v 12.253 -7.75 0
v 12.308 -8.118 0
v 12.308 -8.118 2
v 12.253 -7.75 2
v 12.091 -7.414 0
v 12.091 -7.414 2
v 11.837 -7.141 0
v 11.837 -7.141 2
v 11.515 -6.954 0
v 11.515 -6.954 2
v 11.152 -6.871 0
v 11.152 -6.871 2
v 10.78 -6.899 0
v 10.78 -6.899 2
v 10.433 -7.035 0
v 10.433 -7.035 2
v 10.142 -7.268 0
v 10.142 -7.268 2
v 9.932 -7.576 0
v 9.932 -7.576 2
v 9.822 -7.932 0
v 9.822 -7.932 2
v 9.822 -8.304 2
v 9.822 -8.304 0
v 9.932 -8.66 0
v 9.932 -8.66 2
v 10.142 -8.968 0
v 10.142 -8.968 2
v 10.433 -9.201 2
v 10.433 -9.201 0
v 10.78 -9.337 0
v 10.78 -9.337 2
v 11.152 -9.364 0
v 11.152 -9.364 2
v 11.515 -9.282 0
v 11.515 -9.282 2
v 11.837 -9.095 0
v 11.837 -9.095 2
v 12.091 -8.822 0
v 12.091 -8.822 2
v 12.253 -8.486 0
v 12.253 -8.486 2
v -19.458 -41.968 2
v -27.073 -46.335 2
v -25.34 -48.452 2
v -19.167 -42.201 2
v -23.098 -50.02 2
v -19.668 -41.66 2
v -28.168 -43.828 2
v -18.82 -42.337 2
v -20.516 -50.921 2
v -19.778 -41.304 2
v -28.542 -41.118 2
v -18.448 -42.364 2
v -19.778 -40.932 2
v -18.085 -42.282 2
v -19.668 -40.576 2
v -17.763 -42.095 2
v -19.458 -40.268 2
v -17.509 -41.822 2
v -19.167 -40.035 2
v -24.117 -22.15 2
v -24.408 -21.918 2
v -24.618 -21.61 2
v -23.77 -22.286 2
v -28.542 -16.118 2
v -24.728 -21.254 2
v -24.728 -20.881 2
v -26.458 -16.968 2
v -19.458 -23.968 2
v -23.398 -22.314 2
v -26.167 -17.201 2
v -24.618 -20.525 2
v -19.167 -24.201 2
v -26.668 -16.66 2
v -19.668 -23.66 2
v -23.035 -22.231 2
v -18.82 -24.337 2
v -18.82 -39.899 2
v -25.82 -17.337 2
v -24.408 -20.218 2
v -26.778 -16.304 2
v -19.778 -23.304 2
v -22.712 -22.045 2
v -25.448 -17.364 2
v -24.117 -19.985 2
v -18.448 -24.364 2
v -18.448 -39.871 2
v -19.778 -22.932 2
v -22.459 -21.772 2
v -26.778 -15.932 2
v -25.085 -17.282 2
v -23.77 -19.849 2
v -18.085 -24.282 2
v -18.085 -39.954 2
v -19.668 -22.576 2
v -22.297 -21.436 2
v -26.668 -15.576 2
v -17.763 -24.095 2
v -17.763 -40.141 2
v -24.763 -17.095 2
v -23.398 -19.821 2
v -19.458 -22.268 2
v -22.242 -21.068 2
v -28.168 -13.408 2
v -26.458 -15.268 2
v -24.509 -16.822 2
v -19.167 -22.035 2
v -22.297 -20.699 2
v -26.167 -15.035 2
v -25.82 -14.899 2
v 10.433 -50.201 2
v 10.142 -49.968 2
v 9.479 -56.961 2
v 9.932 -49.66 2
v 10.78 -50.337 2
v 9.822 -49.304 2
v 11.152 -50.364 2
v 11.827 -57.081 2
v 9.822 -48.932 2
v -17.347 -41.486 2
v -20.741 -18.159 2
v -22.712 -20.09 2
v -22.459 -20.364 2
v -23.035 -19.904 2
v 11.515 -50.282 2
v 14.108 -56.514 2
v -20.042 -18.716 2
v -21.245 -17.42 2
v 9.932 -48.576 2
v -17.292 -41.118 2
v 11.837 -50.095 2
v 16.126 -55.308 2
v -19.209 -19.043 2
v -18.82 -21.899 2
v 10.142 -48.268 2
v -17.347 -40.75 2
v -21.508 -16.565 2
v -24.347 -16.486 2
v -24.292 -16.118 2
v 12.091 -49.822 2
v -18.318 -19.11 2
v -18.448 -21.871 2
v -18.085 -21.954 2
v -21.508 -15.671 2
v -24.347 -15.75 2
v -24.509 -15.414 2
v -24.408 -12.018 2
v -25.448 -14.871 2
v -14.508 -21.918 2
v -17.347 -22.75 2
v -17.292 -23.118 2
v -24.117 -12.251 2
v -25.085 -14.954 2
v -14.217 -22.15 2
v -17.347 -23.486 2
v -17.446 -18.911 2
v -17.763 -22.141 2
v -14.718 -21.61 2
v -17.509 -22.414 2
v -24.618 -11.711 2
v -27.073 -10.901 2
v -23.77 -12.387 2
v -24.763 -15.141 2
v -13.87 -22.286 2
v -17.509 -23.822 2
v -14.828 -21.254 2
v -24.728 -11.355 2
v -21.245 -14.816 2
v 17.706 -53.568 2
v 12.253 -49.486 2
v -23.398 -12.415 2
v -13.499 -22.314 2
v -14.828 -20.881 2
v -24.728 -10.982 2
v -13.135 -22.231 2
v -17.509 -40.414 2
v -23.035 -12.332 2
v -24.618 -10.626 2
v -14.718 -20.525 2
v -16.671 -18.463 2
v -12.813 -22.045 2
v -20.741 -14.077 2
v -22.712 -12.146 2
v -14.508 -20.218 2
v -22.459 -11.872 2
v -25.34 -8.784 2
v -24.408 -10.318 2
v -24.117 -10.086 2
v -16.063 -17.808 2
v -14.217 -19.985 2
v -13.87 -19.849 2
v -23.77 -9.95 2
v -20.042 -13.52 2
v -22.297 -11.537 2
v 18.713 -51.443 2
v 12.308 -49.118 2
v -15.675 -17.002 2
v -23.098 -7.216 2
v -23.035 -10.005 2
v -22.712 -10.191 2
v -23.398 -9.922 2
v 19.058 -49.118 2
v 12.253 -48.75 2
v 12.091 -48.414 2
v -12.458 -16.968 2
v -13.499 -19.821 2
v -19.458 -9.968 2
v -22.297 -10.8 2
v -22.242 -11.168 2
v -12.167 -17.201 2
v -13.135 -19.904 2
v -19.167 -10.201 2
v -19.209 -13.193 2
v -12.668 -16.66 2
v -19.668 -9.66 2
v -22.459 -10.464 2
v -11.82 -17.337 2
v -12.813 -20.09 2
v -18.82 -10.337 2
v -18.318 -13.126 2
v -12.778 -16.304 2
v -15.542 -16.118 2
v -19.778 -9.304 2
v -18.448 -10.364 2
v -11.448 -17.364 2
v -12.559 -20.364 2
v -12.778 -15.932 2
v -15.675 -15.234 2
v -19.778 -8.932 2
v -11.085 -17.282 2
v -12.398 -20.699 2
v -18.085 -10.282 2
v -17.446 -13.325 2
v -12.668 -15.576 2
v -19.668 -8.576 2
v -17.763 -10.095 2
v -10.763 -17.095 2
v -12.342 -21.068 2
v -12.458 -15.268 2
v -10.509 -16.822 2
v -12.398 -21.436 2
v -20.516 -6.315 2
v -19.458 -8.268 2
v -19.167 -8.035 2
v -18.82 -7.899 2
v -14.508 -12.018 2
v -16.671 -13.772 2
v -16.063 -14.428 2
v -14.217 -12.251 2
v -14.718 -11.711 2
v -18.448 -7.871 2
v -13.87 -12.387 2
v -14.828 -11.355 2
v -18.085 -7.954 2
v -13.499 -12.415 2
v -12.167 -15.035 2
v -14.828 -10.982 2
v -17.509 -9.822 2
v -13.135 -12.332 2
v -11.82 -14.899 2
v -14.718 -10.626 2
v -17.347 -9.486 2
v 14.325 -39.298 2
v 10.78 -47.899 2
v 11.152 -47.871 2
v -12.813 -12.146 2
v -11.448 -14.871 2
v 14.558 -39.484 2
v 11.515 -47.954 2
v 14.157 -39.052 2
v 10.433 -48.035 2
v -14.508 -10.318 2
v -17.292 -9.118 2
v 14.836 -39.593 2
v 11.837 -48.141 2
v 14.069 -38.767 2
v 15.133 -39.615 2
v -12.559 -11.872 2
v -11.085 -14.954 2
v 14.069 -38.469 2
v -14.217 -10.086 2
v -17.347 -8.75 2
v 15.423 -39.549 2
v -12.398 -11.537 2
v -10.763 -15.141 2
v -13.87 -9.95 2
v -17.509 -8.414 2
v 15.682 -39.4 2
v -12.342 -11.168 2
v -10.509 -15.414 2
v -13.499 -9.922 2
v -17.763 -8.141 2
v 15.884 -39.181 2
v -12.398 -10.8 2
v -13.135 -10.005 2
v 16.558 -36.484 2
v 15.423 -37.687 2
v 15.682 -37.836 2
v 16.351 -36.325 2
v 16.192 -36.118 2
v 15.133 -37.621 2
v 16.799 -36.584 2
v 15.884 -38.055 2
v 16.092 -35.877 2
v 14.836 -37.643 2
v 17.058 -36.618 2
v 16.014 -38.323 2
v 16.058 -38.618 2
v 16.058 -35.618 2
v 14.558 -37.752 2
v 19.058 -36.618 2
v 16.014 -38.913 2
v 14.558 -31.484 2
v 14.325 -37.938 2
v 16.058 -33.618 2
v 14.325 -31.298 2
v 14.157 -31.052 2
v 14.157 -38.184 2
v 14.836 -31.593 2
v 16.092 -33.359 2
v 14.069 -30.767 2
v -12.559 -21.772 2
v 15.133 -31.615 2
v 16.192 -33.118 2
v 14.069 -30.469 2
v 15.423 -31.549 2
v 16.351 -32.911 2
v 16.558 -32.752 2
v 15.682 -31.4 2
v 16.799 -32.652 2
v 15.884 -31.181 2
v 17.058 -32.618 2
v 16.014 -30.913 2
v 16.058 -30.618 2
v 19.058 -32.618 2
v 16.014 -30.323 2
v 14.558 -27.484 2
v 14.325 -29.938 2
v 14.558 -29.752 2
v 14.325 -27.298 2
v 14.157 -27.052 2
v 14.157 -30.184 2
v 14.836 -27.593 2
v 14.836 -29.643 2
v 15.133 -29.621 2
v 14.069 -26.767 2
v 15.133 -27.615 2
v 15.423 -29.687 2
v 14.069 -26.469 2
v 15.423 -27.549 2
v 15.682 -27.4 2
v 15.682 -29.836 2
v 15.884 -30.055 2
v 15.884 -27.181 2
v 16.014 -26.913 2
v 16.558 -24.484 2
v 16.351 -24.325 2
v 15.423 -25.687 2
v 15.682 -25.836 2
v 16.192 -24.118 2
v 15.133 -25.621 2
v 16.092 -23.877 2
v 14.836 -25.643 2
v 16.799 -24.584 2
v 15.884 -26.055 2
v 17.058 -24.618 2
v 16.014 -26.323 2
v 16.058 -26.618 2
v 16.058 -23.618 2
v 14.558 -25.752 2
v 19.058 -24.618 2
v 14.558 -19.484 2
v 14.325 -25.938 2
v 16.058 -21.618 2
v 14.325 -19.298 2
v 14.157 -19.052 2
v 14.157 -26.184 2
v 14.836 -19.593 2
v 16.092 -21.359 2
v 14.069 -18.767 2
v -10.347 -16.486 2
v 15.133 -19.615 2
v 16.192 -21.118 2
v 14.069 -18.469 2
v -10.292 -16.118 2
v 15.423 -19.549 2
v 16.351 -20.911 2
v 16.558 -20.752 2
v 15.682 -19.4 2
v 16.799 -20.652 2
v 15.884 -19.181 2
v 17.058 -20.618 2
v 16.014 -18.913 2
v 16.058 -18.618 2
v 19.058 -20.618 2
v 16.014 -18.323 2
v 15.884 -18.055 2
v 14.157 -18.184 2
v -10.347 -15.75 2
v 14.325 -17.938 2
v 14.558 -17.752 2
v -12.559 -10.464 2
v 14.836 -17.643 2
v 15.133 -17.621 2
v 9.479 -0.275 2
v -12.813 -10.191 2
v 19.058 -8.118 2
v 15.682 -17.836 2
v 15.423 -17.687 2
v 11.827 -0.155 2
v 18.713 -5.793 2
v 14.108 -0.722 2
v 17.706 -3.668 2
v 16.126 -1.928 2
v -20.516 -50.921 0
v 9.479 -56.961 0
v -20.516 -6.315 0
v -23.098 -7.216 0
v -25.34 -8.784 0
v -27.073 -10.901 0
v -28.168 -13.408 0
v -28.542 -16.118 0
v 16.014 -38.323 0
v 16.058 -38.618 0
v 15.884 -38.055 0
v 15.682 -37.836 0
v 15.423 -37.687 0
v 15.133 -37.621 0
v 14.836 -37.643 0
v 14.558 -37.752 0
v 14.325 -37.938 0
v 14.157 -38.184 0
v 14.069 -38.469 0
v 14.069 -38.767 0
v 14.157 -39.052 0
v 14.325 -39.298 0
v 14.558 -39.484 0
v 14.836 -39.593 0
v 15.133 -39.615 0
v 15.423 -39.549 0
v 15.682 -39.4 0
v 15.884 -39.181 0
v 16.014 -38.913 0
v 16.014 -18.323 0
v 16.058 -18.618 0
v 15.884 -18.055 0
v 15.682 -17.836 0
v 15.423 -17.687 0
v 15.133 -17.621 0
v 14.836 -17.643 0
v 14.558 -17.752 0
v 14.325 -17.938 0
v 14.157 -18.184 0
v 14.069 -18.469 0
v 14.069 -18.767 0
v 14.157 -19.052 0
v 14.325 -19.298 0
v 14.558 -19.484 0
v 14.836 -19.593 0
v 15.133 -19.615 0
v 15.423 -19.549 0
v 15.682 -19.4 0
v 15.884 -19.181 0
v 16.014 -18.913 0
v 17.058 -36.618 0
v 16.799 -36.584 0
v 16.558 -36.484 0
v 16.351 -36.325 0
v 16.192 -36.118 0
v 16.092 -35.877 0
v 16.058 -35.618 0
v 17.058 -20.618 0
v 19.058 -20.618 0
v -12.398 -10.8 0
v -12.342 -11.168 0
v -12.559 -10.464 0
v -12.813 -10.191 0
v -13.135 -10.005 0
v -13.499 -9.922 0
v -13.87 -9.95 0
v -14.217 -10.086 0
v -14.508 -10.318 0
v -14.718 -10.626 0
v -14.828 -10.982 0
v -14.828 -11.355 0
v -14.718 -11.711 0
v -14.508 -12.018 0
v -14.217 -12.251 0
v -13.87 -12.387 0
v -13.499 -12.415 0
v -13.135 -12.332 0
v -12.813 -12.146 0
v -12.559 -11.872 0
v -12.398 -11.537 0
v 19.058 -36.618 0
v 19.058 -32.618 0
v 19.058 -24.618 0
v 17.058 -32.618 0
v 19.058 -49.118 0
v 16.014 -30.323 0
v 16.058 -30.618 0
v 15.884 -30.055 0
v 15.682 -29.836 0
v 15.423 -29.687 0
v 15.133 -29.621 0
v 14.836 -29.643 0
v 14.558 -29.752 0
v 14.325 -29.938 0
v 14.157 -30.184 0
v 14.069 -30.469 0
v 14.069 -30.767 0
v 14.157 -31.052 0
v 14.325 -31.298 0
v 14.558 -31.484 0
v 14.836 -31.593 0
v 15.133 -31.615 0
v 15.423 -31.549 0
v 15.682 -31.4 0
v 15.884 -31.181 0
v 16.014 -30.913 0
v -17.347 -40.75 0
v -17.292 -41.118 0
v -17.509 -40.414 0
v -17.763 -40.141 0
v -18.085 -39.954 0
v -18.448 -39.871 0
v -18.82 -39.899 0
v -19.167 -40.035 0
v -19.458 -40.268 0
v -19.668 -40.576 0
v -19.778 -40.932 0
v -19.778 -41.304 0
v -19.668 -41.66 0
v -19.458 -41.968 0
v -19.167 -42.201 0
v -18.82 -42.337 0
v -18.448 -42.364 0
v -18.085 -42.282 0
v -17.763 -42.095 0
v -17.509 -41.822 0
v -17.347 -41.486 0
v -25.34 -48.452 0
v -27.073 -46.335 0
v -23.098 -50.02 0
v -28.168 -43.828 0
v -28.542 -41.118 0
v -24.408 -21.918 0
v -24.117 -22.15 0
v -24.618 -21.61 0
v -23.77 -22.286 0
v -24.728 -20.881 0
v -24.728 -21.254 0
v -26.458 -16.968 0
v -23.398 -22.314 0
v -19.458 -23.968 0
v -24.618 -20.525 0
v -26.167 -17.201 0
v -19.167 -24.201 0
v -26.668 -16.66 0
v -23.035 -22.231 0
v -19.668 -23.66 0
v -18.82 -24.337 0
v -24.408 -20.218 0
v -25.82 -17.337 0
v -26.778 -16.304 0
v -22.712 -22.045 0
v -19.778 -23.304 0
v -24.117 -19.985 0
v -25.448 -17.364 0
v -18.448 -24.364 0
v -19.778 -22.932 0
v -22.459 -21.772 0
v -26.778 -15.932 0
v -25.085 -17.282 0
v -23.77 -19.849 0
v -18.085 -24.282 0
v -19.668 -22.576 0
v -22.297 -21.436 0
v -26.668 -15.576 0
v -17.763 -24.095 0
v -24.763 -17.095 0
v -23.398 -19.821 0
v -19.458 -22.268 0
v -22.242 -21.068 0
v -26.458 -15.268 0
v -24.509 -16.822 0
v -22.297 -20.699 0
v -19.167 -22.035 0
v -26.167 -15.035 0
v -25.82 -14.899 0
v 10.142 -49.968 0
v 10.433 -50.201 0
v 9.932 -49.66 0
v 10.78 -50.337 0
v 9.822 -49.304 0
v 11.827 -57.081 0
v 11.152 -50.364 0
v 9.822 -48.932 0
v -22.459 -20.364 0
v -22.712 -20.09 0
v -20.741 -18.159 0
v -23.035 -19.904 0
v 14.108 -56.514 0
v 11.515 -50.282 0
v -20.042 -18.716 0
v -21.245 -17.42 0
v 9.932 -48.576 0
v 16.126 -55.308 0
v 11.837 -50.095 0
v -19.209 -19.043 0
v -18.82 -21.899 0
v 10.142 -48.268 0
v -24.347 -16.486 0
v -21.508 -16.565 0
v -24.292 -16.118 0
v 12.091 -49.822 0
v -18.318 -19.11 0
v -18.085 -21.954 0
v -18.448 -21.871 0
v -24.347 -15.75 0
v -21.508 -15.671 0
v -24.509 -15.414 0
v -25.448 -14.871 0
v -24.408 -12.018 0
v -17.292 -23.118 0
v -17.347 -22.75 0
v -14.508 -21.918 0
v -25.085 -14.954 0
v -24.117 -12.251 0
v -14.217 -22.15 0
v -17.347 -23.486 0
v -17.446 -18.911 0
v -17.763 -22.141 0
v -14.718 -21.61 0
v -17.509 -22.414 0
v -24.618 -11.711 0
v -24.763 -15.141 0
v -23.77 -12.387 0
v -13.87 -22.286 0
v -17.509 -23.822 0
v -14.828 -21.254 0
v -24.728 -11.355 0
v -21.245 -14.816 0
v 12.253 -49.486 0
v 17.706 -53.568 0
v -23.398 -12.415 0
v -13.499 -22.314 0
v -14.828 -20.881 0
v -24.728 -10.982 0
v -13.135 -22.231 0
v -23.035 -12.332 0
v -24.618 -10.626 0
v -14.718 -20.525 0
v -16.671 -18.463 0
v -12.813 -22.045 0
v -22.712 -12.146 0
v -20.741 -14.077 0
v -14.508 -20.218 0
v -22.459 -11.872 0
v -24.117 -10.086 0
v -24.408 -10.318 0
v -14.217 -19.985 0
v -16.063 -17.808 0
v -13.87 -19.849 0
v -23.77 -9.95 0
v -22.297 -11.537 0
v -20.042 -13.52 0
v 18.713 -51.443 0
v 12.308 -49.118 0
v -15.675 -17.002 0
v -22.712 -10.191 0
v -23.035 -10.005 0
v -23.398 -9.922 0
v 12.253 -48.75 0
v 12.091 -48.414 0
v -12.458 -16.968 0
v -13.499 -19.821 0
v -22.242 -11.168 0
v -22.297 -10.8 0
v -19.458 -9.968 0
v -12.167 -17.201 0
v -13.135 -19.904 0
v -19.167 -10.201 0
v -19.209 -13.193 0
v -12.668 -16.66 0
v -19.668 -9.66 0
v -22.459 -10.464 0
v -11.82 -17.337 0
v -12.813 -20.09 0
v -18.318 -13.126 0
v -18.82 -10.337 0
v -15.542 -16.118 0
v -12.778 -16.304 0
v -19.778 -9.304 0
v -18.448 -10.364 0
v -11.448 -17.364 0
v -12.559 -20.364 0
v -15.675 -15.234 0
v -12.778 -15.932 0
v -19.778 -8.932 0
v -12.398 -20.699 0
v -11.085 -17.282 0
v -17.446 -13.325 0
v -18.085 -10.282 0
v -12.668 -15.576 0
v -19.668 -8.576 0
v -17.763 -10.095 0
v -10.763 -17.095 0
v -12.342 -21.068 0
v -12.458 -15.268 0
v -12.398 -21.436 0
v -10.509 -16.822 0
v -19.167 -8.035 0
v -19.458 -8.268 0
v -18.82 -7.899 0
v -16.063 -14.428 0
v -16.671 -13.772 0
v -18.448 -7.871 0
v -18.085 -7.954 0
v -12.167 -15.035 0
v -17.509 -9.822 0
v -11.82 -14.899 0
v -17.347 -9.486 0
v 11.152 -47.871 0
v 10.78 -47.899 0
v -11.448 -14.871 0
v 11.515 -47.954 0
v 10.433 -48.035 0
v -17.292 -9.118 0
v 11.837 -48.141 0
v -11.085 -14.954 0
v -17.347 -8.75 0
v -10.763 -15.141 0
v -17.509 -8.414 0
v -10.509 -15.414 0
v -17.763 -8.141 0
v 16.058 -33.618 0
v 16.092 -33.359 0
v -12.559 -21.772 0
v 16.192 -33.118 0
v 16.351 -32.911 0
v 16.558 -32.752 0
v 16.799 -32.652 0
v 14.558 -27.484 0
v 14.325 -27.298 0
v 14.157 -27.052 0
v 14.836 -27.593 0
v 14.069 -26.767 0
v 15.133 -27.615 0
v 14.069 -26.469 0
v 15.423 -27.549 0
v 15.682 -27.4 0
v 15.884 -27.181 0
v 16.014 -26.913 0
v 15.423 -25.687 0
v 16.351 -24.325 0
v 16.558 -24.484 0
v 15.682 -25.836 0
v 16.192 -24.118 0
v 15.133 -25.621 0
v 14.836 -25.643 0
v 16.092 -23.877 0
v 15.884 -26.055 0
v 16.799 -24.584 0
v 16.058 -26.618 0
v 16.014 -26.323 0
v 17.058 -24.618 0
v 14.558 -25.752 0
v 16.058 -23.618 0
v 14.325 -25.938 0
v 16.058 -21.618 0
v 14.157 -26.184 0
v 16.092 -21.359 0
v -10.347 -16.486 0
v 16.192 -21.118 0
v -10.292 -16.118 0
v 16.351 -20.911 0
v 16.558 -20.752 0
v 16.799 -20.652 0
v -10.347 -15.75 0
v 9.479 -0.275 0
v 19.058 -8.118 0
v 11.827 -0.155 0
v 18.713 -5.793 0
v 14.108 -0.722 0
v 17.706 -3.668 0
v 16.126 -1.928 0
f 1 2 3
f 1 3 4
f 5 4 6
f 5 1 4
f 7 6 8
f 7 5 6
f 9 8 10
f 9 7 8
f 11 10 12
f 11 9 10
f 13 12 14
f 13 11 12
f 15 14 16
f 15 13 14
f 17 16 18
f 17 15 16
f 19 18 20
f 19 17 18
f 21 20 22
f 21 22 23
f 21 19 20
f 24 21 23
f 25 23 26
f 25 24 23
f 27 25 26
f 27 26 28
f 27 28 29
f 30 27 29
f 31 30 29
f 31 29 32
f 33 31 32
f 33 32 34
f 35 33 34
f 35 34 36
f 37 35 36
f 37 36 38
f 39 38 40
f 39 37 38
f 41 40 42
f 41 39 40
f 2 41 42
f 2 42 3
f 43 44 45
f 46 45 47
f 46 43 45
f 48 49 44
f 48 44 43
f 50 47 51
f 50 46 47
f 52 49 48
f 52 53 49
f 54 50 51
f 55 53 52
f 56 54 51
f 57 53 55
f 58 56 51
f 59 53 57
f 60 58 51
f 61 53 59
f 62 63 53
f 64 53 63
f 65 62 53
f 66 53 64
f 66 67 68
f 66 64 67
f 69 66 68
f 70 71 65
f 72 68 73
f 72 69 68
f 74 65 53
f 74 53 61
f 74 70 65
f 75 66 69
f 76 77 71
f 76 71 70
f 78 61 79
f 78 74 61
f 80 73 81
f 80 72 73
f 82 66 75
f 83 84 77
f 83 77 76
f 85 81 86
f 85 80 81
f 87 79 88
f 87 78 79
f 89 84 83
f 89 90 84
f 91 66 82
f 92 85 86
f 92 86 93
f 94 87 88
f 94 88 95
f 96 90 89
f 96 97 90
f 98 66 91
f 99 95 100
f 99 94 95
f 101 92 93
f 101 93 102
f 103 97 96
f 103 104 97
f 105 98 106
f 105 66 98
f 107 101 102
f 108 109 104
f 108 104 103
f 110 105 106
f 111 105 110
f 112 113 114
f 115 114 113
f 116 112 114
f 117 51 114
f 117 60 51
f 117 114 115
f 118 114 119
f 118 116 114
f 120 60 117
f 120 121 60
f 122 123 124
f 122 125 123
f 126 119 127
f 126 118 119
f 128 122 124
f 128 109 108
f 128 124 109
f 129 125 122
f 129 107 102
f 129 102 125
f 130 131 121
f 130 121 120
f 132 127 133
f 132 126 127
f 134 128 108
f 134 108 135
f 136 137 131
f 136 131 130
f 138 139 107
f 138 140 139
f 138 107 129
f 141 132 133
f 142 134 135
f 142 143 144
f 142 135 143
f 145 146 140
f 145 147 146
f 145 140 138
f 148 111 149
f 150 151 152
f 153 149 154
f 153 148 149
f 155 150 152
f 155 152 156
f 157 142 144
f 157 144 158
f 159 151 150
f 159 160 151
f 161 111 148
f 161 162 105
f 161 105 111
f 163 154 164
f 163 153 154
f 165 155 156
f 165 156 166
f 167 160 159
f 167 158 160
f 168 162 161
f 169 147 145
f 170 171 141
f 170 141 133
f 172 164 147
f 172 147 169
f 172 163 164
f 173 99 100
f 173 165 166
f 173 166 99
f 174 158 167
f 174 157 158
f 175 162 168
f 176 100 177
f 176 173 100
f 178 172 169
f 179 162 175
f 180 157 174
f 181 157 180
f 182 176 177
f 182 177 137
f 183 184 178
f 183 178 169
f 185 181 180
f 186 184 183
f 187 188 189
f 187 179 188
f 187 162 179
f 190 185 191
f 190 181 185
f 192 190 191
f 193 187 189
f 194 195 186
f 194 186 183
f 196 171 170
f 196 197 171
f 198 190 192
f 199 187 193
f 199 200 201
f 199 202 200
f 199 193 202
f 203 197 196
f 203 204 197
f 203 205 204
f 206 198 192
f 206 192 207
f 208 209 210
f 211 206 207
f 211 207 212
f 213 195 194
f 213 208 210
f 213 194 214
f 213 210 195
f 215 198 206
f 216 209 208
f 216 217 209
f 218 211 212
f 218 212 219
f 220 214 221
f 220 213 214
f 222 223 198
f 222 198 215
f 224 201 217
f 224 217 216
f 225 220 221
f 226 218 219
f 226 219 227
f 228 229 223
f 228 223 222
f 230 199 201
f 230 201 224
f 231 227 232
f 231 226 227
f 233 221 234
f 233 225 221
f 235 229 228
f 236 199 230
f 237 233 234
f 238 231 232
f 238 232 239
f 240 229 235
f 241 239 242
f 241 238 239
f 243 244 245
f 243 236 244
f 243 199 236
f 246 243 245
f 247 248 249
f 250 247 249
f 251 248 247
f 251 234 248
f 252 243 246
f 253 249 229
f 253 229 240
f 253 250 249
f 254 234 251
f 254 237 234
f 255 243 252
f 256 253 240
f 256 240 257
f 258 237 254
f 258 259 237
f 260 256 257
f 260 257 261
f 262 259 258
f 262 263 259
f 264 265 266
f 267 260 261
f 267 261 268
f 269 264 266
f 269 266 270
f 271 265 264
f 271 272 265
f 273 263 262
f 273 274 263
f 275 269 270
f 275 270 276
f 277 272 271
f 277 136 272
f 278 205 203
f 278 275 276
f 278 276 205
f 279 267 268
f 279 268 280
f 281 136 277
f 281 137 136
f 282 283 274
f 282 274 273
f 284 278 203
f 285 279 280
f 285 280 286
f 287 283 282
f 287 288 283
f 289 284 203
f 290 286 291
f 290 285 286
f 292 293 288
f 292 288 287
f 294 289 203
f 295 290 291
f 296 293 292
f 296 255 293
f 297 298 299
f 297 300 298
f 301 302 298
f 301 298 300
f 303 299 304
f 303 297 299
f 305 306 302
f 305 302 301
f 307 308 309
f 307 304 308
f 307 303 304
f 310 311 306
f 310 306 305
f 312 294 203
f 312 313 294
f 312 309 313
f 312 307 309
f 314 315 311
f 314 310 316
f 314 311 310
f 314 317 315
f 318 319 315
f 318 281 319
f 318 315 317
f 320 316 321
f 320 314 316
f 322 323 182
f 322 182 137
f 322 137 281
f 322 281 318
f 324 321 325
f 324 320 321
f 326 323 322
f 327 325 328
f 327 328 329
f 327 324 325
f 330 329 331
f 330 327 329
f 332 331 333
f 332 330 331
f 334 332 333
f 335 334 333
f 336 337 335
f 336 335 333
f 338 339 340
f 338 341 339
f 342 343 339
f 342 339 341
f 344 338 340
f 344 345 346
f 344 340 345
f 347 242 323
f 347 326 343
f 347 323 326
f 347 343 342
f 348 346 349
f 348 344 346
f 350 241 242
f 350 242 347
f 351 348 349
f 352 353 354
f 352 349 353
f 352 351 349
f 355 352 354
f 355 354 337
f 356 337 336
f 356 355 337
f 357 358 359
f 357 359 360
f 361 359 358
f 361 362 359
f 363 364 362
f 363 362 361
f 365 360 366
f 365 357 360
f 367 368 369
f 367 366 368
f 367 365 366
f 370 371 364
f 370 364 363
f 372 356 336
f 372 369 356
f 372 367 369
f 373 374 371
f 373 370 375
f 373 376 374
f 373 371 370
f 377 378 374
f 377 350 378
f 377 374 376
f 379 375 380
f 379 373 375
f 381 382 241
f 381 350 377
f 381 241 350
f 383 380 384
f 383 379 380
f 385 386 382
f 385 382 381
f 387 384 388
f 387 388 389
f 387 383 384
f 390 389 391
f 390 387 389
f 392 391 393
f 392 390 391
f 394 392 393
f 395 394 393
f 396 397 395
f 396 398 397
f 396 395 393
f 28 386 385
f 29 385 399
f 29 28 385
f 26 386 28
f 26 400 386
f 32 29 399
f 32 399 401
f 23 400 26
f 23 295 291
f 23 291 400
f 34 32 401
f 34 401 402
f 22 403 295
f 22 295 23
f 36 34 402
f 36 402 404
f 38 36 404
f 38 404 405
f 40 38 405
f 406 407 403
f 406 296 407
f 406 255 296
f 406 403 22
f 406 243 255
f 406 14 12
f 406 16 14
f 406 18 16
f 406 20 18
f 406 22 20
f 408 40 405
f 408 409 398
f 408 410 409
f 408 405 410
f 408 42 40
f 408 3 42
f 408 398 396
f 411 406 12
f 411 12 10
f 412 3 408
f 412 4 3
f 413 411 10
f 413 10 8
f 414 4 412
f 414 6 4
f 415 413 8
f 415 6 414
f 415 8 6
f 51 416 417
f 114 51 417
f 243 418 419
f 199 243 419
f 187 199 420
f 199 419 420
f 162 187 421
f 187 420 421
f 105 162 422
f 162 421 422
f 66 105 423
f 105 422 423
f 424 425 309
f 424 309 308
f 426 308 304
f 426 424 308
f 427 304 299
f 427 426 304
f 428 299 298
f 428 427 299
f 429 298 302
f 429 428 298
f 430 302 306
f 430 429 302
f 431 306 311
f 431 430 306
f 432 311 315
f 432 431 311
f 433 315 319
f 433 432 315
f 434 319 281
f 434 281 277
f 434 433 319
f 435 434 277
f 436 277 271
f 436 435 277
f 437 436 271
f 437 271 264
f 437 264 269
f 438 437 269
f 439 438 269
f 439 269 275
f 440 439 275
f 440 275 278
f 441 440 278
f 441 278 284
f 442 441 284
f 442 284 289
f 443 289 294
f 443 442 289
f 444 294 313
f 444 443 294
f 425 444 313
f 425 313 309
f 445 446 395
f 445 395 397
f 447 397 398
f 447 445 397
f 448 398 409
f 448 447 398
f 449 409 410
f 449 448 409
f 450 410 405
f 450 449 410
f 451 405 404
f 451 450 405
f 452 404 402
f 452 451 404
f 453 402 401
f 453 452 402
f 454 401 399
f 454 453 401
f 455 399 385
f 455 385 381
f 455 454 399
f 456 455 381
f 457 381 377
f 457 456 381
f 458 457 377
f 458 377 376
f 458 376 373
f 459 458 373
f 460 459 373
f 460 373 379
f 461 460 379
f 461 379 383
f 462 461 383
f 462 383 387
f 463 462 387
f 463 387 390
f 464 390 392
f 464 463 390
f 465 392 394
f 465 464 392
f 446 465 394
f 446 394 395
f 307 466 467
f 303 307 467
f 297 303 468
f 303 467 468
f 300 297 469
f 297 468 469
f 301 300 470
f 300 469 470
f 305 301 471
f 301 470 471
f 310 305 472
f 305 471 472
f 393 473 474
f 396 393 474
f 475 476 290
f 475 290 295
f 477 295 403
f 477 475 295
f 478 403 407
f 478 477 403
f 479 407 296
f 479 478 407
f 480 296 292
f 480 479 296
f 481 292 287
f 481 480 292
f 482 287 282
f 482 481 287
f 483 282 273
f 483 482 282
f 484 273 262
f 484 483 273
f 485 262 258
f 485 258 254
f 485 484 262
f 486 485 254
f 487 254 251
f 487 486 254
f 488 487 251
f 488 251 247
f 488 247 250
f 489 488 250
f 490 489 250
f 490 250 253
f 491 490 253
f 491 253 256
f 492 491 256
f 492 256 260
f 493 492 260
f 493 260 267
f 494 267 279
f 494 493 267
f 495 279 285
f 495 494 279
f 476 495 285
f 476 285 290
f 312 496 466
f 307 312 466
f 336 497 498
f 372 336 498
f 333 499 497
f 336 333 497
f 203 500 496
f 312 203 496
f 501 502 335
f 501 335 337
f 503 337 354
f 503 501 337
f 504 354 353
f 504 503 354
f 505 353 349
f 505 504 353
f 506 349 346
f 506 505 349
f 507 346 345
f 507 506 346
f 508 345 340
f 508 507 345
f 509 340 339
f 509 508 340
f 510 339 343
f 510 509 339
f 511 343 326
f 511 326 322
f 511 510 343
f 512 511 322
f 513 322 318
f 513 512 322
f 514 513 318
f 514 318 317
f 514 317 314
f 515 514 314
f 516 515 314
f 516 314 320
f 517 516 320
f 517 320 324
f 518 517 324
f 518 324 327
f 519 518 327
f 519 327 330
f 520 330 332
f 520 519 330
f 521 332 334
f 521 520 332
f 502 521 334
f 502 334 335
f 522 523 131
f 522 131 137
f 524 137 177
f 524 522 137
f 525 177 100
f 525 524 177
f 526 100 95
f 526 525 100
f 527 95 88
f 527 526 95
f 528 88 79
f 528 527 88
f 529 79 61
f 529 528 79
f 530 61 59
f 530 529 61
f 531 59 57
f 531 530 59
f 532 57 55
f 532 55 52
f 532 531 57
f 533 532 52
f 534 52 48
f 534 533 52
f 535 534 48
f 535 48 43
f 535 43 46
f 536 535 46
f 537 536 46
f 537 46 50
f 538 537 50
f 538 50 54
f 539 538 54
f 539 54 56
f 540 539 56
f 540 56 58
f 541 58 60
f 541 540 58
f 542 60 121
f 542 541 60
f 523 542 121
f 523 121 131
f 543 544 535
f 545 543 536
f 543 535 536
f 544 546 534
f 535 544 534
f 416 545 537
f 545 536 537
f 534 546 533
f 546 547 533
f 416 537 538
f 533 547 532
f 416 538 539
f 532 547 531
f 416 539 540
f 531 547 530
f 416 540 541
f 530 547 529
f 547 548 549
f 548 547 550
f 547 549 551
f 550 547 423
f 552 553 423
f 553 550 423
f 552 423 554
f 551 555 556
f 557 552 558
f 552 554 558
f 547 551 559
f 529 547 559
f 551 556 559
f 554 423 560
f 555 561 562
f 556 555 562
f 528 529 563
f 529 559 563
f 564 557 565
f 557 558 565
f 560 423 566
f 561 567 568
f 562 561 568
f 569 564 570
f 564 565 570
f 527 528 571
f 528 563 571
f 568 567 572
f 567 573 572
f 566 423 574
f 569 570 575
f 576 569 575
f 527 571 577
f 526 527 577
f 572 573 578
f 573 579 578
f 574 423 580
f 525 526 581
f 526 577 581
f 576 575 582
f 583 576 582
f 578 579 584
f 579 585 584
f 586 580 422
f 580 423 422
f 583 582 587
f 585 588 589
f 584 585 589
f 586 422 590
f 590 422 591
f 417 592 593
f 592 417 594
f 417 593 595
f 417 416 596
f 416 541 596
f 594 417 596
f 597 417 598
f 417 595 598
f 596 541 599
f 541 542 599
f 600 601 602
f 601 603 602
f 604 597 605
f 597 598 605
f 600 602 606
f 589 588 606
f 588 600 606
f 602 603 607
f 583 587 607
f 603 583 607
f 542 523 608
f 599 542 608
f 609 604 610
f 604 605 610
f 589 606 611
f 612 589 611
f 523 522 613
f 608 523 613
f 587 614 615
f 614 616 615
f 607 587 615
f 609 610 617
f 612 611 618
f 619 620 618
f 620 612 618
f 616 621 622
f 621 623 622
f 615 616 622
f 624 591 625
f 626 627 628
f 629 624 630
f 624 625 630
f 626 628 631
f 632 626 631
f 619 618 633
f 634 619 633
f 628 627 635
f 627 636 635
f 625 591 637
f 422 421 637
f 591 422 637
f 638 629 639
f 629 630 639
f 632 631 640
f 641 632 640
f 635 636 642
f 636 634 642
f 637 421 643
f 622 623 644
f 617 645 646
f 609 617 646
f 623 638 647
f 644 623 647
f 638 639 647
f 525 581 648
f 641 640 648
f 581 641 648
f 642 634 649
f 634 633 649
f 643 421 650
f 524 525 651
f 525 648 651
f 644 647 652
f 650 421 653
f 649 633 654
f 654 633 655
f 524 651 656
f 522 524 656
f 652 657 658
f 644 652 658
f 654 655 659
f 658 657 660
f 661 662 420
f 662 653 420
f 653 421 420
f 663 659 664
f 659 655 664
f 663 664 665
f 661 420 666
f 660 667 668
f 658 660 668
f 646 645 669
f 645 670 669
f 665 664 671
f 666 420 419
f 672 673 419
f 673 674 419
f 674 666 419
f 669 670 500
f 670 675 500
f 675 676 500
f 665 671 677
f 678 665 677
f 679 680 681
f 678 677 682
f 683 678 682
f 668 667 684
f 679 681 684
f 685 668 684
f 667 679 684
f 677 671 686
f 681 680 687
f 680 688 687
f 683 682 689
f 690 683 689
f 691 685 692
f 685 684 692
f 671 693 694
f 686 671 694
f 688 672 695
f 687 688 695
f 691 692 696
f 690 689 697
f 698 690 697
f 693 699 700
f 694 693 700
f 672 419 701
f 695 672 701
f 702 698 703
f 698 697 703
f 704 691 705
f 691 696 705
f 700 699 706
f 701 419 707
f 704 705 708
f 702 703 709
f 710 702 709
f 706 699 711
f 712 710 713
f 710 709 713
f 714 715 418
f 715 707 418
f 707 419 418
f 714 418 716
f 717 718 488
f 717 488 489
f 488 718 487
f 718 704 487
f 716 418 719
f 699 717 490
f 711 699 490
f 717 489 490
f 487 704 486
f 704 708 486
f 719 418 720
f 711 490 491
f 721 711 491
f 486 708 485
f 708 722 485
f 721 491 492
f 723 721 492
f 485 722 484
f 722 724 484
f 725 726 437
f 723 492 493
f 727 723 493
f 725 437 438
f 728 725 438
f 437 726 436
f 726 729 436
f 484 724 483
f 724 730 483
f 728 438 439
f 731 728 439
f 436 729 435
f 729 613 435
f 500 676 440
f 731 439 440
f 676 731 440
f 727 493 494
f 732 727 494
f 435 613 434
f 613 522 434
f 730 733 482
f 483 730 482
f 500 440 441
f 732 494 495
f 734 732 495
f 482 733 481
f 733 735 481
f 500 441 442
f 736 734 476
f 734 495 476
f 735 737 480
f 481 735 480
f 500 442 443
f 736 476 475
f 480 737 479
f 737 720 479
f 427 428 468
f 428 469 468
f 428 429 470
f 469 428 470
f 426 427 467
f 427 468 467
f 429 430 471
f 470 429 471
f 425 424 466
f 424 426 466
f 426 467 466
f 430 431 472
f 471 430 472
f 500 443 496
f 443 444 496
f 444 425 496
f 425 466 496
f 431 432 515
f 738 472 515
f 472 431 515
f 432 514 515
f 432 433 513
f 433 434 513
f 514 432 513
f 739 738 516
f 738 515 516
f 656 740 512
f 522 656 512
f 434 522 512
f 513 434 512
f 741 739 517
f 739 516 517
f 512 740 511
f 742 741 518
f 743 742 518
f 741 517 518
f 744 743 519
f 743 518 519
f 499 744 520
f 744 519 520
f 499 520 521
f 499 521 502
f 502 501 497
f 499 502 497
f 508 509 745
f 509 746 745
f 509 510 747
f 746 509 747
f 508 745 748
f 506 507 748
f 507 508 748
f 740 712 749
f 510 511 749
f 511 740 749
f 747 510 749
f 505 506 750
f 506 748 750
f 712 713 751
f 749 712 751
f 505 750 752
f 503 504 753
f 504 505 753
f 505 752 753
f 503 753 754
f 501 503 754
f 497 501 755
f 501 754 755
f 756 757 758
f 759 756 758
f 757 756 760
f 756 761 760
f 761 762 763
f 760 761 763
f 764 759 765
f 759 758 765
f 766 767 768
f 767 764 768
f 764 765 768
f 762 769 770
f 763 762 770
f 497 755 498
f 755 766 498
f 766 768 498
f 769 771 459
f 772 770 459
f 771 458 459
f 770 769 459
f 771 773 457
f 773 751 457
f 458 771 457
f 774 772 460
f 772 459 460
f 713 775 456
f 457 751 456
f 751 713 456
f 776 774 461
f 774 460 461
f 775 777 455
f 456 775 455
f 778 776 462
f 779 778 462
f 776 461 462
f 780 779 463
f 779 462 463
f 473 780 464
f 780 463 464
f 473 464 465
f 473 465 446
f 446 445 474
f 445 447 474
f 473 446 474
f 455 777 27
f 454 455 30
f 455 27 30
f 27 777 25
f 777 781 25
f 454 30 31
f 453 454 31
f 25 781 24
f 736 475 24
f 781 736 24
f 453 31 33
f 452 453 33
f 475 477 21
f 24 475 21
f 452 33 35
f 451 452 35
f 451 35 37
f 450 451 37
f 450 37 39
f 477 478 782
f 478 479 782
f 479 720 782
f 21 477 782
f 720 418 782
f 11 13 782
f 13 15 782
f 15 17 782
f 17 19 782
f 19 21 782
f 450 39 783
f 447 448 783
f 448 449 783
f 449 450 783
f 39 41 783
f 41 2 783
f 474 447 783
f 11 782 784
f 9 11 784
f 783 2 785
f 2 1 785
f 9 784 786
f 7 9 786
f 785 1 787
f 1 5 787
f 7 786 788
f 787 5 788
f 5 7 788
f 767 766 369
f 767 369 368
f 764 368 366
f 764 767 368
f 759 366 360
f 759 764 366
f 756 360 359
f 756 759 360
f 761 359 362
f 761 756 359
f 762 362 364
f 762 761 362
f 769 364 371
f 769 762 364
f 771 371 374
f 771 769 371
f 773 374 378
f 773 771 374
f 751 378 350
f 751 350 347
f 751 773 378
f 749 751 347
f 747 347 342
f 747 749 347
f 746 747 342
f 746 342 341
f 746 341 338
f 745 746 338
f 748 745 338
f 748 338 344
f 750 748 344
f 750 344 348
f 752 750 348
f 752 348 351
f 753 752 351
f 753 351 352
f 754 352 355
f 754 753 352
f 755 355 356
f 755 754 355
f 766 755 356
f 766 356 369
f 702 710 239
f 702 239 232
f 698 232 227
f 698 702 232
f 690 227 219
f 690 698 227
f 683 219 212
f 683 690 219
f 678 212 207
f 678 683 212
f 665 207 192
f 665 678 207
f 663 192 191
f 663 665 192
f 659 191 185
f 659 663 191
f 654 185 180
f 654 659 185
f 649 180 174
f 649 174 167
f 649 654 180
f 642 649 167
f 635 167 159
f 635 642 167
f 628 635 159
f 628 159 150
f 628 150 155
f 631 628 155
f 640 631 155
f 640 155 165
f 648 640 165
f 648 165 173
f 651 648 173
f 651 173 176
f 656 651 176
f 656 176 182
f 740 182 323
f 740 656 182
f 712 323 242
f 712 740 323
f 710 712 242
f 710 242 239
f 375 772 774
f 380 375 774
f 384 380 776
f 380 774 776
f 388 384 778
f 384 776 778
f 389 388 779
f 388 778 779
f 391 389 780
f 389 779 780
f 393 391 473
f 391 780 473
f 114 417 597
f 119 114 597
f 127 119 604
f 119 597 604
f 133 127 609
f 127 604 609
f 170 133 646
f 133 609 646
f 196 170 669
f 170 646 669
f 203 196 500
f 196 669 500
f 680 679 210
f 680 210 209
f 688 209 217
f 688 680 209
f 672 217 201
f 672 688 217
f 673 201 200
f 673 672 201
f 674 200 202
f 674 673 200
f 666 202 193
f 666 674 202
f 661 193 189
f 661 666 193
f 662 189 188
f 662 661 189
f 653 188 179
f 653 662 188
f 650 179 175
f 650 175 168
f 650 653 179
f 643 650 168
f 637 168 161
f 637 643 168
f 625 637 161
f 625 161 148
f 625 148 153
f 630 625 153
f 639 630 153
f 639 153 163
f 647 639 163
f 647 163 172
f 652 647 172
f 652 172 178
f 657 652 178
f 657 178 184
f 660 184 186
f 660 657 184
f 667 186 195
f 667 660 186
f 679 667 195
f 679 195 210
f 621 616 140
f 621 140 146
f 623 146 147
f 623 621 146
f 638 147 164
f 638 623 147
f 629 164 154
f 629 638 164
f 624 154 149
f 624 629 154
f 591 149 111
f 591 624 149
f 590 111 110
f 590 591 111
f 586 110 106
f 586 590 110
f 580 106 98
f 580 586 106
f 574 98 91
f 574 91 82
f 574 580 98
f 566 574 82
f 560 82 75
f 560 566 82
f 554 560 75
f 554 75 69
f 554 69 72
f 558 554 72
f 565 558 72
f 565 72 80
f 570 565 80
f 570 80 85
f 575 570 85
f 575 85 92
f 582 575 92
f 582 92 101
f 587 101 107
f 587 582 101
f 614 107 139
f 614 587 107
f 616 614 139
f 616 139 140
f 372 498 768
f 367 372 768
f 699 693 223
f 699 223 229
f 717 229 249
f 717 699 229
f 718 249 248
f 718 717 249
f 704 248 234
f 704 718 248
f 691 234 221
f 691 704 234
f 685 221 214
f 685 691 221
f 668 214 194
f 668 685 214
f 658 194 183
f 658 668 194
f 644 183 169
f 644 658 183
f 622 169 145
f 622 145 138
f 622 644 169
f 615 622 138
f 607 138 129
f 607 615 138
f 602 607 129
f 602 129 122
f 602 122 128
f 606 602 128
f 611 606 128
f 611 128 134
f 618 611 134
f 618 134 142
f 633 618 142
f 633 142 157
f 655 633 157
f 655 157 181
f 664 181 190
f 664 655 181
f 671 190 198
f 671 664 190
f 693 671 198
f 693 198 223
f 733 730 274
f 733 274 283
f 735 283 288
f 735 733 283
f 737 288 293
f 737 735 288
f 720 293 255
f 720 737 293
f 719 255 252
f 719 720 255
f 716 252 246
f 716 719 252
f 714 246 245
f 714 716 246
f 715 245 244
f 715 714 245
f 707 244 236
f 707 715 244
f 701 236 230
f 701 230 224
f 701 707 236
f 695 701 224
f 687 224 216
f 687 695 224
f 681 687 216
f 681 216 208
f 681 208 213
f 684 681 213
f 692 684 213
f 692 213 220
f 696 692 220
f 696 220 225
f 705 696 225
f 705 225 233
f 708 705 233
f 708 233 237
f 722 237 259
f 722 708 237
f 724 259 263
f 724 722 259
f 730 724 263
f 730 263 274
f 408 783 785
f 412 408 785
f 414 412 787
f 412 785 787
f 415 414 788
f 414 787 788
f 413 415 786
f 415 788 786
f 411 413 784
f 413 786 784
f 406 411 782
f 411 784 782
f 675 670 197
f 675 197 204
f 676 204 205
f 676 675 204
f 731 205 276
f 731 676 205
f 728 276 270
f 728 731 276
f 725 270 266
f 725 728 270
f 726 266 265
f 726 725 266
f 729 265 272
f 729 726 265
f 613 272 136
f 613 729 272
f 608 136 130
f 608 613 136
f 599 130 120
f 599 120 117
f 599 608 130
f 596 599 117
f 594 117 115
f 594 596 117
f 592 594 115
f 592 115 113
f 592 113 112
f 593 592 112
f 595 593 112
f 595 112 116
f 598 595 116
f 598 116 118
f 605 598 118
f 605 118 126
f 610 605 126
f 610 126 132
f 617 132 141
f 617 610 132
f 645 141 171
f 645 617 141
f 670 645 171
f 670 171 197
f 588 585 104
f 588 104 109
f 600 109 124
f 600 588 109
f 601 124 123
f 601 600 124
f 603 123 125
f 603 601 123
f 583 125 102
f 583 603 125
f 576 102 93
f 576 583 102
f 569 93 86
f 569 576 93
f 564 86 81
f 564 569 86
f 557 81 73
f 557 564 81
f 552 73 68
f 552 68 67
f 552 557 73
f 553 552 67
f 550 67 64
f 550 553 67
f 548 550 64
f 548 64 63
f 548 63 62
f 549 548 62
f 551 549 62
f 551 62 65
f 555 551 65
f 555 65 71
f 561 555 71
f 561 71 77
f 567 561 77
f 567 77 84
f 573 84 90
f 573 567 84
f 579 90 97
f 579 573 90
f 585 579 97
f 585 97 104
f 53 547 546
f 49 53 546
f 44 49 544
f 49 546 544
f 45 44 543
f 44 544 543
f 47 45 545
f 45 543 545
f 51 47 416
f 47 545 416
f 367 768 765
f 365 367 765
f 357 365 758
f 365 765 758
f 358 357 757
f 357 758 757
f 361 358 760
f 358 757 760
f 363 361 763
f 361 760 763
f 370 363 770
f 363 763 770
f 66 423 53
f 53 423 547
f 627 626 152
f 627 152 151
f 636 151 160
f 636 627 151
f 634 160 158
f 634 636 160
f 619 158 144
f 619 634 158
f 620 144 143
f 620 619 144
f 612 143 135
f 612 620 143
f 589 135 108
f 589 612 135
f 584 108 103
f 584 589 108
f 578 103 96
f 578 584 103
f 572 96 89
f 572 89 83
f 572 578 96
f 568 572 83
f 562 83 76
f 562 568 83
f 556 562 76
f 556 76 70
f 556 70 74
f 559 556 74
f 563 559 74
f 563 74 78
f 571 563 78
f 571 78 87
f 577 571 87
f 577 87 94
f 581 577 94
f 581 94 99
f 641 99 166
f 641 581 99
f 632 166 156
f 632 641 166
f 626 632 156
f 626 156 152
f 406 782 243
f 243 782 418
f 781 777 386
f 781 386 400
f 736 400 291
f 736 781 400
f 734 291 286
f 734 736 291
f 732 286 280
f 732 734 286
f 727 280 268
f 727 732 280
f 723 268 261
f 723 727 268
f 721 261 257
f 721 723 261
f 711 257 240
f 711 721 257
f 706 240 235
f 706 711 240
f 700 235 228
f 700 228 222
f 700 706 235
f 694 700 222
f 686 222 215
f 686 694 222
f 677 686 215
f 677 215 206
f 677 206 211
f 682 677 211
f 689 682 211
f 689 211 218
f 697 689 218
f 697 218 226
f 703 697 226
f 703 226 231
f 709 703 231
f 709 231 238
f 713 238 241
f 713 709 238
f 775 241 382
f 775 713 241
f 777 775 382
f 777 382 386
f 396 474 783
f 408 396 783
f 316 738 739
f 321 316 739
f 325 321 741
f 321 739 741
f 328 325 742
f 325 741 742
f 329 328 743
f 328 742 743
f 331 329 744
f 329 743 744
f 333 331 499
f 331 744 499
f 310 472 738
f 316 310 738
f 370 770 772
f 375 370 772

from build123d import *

# Parameters (mm, degrees)
SKETCH_1_R      = 3
SKETCH_1_R_2    = 1.25
SKETCH_1_R_3    = 1
EXTRUDE_2_DEPTH = 2


with BuildPart() as part:
    # 草圖1 → 填料-伸長2 (new body)
    with BuildSketch(Plane.XY):
        with BuildLine():
            Line((-28.541905067, -16.1179941), (-28.541905067, -41.1179941))
            ThreePointArc((-28.541905067, -41.1179941), (-26.279428563, -47.452876116), (-20.515759037, -50.921253788))
            Line((-20.515759037, -50.921253788), (9.479011757, -56.960601851))
            ThreePointArc((9.479011757, -56.960601851), (16.126000545, -55.308012897), (19.058094933, -49.1179941))
            Line((19.058094933, -49.1179941), (19.058094933, -36.6179941))
            Line((19.058094933, -36.6179941), (17.058094933, -36.6179941))
            ThreePointArc((17.058094933, -36.6179941), (16.350988152, -36.325100881), (16.058094933, -35.6179941))
            Line((16.058094933, -35.6179941), (16.058094933, -33.6179941))
            ThreePointArc((16.058094933, -33.6179941), (16.350988152, -32.910887319), (17.058094933, -32.6179941))
            Line((17.058094933, -32.6179941), (19.058094933, -32.6179941))
            Line((19.058094933, -32.6179941), (19.058094933, -24.6179941))
            Line((19.058094933, -24.6179941), (17.058094933, -24.6179941))
            ThreePointArc((17.058094933, -24.6179941), (16.350988152, -24.325100881), (16.058094933, -23.6179941))
            Line((16.058094933, -23.6179941), (16.058094933, -21.6179941))
            ThreePointArc((16.058094933, -21.6179941), (16.350988152, -20.910887319), (17.058094933, -20.6179941))
            Line((17.058094933, -20.6179941), (19.058094933, -20.6179941))
            Line((19.058094933, -20.6179941), (19.058094933, -8.1179941))
            ThreePointArc((19.058094933, -8.1179941), (16.126000545, -1.927975304), (9.479011757, -0.27538635))
            Line((9.479011757, -0.27538635), (-20.515759037, -6.314734412))
            ThreePointArc((-20.515759037, -6.314734412), (-26.279428563, -9.783112085), (-28.541905067, -16.1179941))
        make_face()
        with Locations((-18.541905067, -16.1179941)):
            Circle(SKETCH_1_R, mode=Mode.SUBTRACT)
        with Locations((-18.541905067, -9.1179941)):
            Circle(SKETCH_1_R_2, mode=Mode.SUBTRACT)
        with Locations((-13.592157599, -11.168246632)):
            Circle(SKETCH_1_R_2, mode=Mode.SUBTRACT)
        with Locations((-11.541905067, -16.1179941)):
            Circle(SKETCH_1_R_2, mode=Mode.SUBTRACT)
        with Locations((-13.592157599, -21.067741569)):
            Circle(SKETCH_1_R_2, mode=Mode.SUBTRACT)
        with Locations((-18.541905067, -23.1179941)):
            Circle(SKETCH_1_R_2, mode=Mode.SUBTRACT)
        with Locations((-23.491652536, -21.067741569)):
            Circle(SKETCH_1_R_2, mode=Mode.SUBTRACT)
        with Locations((-25.541905067, -16.1179941)):
            Circle(SKETCH_1_R_2, mode=Mode.SUBTRACT)
        with Locations((-23.491652536, -11.168246632)):
            Circle(SKETCH_1_R_2, mode=Mode.SUBTRACT)
        with Locations((-18.541905067, -41.1179941)):
            Circle(SKETCH_1_R_2, mode=Mode.SUBTRACT)
        with Locations((11.058094933, -8.1179941)):
            Circle(SKETCH_1_R_2, mode=Mode.SUBTRACT)
        with Locations((11.058094933, -49.1179941)):
            Circle(SKETCH_1_R_2, mode=Mode.SUBTRACT)
        with Locations((15.058094933, -26.6179941)):
            Circle(SKETCH_1_R_3, mode=Mode.SUBTRACT)
        with Locations((15.058094933, -18.6179941)):
            Circle(SKETCH_1_R_3, mode=Mode.SUBTRACT)
        with Locations((15.058094933, -38.6179941)):
            Circle(SKETCH_1_R_3, mode=Mode.SUBTRACT)
        with Locations((15.058094933, -30.6179941)):
            Circle(SKETCH_1_R_3, mode=Mode.SUBTRACT)
    extrude(amount=EXTRUDE_2_DEPTH)


solid = part.part
